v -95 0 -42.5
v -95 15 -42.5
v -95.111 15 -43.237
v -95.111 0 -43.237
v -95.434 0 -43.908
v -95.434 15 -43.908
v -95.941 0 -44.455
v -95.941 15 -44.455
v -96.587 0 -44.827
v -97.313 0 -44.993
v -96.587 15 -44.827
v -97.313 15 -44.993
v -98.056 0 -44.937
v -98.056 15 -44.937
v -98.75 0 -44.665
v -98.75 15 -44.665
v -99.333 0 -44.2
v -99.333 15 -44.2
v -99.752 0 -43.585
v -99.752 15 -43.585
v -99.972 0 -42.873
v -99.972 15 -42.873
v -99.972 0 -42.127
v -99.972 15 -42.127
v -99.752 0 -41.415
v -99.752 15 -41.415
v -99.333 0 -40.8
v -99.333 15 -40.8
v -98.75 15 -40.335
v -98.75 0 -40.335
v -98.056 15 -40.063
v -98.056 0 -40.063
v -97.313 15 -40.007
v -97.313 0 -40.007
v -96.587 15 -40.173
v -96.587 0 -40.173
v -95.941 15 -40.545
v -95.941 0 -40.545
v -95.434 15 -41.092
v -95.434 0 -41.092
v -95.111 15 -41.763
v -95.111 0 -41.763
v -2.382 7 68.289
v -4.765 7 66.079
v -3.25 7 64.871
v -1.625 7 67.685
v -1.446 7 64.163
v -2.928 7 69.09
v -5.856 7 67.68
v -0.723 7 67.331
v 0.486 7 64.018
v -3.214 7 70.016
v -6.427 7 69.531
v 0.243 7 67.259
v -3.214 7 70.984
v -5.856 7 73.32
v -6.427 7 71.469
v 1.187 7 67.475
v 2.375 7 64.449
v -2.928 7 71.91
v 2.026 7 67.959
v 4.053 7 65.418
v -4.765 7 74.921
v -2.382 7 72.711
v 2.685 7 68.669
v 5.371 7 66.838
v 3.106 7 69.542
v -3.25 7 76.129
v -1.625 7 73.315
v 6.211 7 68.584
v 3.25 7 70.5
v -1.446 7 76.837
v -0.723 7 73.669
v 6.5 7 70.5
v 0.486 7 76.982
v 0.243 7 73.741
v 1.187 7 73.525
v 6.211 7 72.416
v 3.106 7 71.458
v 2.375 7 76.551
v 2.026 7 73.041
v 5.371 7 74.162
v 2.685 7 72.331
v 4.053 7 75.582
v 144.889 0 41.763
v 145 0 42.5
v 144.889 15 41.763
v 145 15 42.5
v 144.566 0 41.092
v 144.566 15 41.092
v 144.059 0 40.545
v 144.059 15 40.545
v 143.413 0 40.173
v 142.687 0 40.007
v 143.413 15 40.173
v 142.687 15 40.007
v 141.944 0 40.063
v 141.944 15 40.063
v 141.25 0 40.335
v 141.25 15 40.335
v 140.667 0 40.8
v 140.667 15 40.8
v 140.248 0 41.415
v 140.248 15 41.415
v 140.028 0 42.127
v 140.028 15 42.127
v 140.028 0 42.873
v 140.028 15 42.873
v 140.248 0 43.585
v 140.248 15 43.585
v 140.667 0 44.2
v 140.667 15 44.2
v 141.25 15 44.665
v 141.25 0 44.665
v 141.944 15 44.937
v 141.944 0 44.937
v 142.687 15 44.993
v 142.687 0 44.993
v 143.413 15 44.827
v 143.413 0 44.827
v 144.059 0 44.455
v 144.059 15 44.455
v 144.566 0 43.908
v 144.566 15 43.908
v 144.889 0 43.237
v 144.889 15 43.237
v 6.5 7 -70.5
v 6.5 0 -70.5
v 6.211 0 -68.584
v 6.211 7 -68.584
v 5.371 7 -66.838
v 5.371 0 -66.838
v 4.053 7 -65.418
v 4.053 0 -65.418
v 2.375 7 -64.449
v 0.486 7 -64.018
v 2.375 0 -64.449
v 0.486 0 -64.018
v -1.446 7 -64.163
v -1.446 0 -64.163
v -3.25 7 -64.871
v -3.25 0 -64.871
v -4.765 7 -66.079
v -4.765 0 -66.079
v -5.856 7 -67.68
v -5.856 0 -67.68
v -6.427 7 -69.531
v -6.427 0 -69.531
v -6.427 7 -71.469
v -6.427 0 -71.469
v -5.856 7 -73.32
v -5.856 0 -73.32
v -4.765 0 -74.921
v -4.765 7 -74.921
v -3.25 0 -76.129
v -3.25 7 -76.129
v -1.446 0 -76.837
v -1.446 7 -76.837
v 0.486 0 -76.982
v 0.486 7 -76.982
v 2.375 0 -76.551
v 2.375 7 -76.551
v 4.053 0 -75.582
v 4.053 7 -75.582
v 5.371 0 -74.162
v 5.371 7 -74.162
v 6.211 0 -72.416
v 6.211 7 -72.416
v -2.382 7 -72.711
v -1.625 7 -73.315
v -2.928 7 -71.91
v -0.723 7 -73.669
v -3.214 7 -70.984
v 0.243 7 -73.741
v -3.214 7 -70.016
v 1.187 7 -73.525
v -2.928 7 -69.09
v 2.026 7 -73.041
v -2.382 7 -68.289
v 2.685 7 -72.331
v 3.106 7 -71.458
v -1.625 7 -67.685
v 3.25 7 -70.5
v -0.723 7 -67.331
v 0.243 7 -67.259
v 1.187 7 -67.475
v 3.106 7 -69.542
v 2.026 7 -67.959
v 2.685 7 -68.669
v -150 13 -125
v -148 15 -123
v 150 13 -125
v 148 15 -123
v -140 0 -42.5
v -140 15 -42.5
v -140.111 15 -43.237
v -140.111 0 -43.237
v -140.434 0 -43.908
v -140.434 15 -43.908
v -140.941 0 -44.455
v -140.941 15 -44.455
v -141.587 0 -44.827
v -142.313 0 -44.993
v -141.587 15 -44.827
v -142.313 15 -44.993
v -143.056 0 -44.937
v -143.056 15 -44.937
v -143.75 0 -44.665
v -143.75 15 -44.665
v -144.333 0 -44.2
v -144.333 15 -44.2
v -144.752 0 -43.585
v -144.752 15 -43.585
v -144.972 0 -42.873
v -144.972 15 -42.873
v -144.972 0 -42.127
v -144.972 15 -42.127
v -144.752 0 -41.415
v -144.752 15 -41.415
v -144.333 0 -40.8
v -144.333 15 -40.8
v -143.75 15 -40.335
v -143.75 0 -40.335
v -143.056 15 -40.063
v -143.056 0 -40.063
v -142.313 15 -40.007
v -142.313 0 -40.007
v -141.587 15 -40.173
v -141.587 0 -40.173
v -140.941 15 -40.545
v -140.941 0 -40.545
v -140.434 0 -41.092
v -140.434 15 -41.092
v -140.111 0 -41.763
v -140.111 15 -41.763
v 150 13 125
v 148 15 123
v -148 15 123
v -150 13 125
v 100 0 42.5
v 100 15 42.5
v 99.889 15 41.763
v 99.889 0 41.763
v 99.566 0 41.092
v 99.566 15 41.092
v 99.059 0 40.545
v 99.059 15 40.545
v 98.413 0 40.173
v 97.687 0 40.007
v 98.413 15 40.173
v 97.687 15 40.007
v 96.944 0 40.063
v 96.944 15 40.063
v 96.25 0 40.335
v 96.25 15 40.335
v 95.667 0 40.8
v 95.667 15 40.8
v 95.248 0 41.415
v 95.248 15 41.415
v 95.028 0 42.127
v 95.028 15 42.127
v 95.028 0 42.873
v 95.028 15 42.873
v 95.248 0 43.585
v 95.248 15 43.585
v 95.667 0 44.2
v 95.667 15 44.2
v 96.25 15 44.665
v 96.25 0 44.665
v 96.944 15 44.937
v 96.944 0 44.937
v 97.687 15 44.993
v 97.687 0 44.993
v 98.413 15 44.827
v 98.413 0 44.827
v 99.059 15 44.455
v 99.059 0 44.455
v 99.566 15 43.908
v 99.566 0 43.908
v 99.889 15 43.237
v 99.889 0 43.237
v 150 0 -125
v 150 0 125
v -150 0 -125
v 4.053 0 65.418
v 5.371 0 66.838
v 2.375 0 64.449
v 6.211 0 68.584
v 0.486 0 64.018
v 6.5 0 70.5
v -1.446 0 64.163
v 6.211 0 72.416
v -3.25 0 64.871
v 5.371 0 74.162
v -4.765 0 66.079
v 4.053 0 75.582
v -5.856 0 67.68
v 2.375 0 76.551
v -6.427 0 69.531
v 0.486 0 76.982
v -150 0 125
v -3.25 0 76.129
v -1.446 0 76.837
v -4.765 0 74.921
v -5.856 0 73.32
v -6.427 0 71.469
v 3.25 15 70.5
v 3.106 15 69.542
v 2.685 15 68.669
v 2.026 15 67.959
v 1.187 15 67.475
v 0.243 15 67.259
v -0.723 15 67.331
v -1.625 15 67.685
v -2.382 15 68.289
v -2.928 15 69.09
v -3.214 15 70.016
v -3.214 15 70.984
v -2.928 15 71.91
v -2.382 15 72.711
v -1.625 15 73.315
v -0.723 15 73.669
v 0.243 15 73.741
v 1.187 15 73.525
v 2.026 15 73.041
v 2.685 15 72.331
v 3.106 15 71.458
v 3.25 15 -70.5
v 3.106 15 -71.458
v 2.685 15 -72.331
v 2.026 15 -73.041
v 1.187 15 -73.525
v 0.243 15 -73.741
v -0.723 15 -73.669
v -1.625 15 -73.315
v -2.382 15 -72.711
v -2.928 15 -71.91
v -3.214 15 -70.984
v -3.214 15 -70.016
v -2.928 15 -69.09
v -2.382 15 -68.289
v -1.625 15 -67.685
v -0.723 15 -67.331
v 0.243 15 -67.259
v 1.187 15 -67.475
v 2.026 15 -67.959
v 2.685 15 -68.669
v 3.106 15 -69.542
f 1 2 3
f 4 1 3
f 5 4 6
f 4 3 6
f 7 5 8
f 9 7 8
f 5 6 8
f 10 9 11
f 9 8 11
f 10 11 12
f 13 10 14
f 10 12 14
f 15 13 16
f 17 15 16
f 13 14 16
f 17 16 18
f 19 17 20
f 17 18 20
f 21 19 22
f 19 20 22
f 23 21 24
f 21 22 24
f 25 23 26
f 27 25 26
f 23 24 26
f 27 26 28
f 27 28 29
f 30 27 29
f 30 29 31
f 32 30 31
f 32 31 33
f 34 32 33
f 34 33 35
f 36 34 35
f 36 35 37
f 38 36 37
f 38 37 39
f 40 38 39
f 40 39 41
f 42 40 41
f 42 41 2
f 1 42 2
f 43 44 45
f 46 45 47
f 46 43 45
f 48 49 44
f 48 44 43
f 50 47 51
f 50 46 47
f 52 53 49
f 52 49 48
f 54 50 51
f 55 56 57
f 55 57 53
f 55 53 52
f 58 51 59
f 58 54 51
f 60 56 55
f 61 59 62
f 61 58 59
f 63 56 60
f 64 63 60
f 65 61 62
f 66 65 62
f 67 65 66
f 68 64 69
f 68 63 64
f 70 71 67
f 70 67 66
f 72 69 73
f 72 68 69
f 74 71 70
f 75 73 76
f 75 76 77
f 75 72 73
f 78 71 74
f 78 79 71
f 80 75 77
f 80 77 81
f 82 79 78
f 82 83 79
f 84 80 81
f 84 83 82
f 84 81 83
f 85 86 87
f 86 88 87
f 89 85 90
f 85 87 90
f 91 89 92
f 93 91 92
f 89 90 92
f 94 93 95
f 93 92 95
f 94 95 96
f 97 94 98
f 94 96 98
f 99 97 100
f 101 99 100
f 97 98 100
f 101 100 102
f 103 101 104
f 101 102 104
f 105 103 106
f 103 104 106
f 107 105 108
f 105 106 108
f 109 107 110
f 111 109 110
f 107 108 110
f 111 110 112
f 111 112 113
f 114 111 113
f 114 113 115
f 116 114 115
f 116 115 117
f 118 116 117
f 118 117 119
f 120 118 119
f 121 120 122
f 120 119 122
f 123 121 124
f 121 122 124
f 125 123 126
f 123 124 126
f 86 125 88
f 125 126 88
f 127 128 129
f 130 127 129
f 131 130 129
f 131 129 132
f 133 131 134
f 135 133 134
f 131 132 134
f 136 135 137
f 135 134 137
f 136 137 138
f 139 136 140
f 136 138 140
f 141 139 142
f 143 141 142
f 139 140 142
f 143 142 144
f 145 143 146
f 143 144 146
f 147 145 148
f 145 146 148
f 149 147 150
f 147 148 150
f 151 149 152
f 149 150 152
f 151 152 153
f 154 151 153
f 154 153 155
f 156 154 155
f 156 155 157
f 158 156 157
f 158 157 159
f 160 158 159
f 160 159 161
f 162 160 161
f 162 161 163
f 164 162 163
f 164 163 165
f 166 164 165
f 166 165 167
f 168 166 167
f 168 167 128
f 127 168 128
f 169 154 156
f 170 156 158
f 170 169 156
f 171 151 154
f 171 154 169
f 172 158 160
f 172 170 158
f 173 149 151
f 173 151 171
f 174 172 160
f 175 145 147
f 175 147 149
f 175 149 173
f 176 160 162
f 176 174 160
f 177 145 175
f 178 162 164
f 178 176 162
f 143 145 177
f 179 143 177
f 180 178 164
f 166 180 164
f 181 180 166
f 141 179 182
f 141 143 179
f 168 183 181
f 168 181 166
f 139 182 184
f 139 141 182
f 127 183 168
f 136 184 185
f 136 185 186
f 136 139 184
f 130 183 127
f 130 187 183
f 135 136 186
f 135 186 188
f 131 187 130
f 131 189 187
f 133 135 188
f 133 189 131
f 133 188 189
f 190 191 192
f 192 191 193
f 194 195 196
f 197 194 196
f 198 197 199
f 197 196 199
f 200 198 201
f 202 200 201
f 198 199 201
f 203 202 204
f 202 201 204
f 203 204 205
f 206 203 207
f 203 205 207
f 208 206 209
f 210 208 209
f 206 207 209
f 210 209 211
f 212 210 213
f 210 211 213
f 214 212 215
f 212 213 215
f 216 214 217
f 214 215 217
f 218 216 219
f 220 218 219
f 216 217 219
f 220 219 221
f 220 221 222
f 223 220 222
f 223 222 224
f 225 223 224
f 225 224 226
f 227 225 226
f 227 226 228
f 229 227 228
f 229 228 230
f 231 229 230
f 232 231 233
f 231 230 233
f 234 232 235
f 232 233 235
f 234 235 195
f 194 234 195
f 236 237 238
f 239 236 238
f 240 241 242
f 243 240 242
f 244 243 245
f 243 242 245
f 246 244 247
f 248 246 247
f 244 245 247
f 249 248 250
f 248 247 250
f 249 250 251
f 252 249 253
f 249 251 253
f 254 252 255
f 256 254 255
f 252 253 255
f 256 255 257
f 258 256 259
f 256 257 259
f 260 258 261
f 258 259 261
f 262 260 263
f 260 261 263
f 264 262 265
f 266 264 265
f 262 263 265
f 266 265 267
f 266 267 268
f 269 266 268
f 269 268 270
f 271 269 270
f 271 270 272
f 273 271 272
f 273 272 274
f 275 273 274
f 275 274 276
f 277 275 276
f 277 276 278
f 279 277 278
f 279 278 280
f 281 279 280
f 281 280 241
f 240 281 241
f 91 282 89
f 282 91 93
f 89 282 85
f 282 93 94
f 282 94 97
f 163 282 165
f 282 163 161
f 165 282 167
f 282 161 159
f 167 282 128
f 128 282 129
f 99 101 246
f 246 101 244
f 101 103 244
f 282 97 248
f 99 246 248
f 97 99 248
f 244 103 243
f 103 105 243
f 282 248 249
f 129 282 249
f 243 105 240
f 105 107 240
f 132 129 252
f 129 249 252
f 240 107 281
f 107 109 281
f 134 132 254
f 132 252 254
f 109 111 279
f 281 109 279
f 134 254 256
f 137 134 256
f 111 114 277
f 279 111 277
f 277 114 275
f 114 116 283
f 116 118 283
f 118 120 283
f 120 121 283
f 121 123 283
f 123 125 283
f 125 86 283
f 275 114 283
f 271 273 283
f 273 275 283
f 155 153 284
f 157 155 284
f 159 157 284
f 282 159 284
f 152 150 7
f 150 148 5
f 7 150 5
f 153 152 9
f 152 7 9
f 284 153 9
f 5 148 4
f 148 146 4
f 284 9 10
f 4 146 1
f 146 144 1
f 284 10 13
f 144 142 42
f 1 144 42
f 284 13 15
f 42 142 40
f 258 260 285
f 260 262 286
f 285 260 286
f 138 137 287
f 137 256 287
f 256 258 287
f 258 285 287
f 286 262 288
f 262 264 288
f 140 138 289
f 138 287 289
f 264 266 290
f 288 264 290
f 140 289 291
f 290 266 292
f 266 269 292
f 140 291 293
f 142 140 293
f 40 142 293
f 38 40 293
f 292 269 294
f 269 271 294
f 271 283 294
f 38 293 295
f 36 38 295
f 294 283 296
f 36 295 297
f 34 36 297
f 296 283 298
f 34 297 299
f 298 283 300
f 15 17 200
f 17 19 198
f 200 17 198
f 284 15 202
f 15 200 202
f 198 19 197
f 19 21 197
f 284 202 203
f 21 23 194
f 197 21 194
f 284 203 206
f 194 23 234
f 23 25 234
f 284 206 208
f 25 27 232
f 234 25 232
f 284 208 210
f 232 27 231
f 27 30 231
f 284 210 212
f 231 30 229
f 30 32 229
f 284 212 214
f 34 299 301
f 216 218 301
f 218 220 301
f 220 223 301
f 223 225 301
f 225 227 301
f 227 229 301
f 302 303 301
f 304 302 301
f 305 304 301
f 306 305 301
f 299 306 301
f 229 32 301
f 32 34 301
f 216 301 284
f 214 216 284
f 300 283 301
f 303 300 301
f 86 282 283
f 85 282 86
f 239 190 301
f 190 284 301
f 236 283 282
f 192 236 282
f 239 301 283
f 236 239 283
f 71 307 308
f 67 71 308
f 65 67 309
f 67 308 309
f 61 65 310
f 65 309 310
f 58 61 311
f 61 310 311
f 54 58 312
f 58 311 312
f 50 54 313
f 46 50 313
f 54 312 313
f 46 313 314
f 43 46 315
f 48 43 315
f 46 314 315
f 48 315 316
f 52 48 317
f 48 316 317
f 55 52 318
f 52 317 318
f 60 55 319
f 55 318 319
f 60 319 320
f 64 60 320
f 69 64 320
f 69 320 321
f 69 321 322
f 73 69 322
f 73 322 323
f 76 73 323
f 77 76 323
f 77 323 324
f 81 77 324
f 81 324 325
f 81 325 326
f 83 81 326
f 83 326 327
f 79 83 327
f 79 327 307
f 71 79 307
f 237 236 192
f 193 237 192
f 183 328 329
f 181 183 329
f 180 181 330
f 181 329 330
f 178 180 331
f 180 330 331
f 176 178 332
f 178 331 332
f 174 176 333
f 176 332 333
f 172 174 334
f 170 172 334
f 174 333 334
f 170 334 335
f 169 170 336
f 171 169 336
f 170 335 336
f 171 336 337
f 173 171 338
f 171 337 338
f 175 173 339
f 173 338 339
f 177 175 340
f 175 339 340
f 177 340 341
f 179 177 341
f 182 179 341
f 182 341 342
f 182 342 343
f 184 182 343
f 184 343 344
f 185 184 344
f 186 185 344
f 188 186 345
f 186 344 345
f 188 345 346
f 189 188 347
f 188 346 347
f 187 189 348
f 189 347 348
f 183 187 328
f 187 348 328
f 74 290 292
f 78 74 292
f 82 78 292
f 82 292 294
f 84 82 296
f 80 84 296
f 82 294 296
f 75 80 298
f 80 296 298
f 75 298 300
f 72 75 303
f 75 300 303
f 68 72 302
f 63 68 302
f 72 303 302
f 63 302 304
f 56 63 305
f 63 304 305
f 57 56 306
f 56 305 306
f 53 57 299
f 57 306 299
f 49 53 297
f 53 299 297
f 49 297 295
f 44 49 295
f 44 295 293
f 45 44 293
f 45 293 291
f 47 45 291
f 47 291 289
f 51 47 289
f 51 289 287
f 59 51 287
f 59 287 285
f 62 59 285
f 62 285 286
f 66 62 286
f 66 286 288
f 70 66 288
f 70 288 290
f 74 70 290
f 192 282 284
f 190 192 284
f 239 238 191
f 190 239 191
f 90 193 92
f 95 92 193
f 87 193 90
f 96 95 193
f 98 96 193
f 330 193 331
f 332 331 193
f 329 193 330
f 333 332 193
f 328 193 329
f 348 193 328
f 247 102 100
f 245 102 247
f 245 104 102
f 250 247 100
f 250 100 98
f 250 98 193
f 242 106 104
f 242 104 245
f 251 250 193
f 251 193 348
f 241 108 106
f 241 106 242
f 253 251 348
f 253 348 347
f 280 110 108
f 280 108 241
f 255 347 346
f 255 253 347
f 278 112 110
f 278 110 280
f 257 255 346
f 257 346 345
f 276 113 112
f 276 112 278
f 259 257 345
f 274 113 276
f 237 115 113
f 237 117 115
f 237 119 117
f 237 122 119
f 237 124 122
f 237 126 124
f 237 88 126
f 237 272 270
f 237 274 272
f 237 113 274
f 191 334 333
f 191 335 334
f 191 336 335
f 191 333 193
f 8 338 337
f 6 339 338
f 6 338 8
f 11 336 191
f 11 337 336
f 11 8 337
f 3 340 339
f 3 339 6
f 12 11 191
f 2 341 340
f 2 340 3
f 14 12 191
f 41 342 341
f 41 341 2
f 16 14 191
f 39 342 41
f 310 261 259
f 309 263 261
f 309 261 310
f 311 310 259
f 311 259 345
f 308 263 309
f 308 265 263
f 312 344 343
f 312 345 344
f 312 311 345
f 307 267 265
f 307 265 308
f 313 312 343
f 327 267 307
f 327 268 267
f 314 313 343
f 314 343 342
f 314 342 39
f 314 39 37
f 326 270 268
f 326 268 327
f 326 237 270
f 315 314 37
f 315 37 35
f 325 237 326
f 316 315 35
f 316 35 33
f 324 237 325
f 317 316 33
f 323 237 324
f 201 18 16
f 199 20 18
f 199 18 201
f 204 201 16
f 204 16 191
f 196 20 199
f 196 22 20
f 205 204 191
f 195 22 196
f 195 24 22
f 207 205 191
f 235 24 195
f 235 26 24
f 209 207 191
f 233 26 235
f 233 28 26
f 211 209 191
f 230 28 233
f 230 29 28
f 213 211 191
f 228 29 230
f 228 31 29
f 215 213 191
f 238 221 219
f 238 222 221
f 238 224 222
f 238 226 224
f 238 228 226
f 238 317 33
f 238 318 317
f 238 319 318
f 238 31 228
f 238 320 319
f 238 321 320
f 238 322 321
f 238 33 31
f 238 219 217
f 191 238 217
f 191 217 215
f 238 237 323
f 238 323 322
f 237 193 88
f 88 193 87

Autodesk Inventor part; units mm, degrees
ref_plane "YZ Plane" through (0, 0, 0) normal (1, 0, 0) x (0, 1, 0)
ref_plane "XZ Plane" through (0, 0, 0) normal (0, 1, 0) x (-1, 0, 0)
ref_plane "XY Plane" through (0, 0, 0) normal (0, 0, 1) x (1, 0, 0)
sketch "Skizze2" plane through (0, 0, 0) normal (0, 1, 0) x (-1, 0, 0)
  line L0 (150, 125) -> (-150, 125)
  line L1 (-150, 125) -> (-150, -125)
  line L2 (-150, -125) -> (150, -125)
  line L3 (150, -125) -> (150, 125)
  point P0 (0, 0)
  dimension "d0" = 300
  dimension "d1" = 250
  dimension "d6" = 125
  dimension "d7" = 150
extrude "Extrusion1" add sketch "Skizze2" along normal blind 15
sketch "Skizze3" plane through (0, 15, 0) normal (0, 1, 0) x (1, 0, 0)
  circle A0 centre (0, -70.5) radius 3.25
  circle A1 centre (0, 70.5) radius 3.25
  point P0 (0, 0)
  dimension "d8" = 6.5
  dimension "d9" = 6.5
  dimension "d16" = 70.5
  dimension "d17" = 70.5
extrude "Extrusion2" cut sketch "Skizze3" against normal blind 15
sketch "Skizze4" plane through (0, 0, 0) normal (0, -1, 0) x (1, 0, 0)
  circle A0 centre (0, 70.5) radius 6.5
  circle A1 centre (0, -70.5) radius 6.5
  point P0 (0, 0)
  dimension "d12" = 13
  dimension "d13" = 13
  dimension "d18" = 70.5
  dimension "d19" = 70.5
extrude "Extrusion3" cut sketch "Skizze4" against normal blind 7
chamfer "Fase1" distance 2 angle 45 4 edges at (0, 15, 125) (150, 15, 0) (0, 15, -125) (-150, 15, 0)
sketch "Skizze5" plane through (0, 15, 0) normal (0, 1, 0) x (1, 0, 0)
  circle A0 centre (142.5, -42.5) radius 2.5
  circle A1 centre (97.5, -42.5) radius 2.5
  circle A2 centre (-142.5, 42.5) radius 2.5
  circle A3 centre (-97.5, 42.5) radius 2.5
  point P0 (0, 0)
  dimension "d23" = 5
  dimension "d24" = 5
  dimension "d25" = 5
  dimension "d26" = 5
extrude "Extrusion4" cut sketch "Skizze5" against normal blind 20
thread "Gewinde1" size "M5x0.8" class "6H" standard "ANSI Metric M Profile" full length
thread "Gewinde2" size "M5x0.8" class "6H" standard "ANSI Metric M Profile" full length
thread "Gewinde3" size "M5x0.8" class "6H" standard "ANSI Metric M Profile" full length
thread "Gewinde4" size "M5x0.8" class "6H" standard "ANSI Metric M Profile" full length
properties part number "Bodenplatte"
